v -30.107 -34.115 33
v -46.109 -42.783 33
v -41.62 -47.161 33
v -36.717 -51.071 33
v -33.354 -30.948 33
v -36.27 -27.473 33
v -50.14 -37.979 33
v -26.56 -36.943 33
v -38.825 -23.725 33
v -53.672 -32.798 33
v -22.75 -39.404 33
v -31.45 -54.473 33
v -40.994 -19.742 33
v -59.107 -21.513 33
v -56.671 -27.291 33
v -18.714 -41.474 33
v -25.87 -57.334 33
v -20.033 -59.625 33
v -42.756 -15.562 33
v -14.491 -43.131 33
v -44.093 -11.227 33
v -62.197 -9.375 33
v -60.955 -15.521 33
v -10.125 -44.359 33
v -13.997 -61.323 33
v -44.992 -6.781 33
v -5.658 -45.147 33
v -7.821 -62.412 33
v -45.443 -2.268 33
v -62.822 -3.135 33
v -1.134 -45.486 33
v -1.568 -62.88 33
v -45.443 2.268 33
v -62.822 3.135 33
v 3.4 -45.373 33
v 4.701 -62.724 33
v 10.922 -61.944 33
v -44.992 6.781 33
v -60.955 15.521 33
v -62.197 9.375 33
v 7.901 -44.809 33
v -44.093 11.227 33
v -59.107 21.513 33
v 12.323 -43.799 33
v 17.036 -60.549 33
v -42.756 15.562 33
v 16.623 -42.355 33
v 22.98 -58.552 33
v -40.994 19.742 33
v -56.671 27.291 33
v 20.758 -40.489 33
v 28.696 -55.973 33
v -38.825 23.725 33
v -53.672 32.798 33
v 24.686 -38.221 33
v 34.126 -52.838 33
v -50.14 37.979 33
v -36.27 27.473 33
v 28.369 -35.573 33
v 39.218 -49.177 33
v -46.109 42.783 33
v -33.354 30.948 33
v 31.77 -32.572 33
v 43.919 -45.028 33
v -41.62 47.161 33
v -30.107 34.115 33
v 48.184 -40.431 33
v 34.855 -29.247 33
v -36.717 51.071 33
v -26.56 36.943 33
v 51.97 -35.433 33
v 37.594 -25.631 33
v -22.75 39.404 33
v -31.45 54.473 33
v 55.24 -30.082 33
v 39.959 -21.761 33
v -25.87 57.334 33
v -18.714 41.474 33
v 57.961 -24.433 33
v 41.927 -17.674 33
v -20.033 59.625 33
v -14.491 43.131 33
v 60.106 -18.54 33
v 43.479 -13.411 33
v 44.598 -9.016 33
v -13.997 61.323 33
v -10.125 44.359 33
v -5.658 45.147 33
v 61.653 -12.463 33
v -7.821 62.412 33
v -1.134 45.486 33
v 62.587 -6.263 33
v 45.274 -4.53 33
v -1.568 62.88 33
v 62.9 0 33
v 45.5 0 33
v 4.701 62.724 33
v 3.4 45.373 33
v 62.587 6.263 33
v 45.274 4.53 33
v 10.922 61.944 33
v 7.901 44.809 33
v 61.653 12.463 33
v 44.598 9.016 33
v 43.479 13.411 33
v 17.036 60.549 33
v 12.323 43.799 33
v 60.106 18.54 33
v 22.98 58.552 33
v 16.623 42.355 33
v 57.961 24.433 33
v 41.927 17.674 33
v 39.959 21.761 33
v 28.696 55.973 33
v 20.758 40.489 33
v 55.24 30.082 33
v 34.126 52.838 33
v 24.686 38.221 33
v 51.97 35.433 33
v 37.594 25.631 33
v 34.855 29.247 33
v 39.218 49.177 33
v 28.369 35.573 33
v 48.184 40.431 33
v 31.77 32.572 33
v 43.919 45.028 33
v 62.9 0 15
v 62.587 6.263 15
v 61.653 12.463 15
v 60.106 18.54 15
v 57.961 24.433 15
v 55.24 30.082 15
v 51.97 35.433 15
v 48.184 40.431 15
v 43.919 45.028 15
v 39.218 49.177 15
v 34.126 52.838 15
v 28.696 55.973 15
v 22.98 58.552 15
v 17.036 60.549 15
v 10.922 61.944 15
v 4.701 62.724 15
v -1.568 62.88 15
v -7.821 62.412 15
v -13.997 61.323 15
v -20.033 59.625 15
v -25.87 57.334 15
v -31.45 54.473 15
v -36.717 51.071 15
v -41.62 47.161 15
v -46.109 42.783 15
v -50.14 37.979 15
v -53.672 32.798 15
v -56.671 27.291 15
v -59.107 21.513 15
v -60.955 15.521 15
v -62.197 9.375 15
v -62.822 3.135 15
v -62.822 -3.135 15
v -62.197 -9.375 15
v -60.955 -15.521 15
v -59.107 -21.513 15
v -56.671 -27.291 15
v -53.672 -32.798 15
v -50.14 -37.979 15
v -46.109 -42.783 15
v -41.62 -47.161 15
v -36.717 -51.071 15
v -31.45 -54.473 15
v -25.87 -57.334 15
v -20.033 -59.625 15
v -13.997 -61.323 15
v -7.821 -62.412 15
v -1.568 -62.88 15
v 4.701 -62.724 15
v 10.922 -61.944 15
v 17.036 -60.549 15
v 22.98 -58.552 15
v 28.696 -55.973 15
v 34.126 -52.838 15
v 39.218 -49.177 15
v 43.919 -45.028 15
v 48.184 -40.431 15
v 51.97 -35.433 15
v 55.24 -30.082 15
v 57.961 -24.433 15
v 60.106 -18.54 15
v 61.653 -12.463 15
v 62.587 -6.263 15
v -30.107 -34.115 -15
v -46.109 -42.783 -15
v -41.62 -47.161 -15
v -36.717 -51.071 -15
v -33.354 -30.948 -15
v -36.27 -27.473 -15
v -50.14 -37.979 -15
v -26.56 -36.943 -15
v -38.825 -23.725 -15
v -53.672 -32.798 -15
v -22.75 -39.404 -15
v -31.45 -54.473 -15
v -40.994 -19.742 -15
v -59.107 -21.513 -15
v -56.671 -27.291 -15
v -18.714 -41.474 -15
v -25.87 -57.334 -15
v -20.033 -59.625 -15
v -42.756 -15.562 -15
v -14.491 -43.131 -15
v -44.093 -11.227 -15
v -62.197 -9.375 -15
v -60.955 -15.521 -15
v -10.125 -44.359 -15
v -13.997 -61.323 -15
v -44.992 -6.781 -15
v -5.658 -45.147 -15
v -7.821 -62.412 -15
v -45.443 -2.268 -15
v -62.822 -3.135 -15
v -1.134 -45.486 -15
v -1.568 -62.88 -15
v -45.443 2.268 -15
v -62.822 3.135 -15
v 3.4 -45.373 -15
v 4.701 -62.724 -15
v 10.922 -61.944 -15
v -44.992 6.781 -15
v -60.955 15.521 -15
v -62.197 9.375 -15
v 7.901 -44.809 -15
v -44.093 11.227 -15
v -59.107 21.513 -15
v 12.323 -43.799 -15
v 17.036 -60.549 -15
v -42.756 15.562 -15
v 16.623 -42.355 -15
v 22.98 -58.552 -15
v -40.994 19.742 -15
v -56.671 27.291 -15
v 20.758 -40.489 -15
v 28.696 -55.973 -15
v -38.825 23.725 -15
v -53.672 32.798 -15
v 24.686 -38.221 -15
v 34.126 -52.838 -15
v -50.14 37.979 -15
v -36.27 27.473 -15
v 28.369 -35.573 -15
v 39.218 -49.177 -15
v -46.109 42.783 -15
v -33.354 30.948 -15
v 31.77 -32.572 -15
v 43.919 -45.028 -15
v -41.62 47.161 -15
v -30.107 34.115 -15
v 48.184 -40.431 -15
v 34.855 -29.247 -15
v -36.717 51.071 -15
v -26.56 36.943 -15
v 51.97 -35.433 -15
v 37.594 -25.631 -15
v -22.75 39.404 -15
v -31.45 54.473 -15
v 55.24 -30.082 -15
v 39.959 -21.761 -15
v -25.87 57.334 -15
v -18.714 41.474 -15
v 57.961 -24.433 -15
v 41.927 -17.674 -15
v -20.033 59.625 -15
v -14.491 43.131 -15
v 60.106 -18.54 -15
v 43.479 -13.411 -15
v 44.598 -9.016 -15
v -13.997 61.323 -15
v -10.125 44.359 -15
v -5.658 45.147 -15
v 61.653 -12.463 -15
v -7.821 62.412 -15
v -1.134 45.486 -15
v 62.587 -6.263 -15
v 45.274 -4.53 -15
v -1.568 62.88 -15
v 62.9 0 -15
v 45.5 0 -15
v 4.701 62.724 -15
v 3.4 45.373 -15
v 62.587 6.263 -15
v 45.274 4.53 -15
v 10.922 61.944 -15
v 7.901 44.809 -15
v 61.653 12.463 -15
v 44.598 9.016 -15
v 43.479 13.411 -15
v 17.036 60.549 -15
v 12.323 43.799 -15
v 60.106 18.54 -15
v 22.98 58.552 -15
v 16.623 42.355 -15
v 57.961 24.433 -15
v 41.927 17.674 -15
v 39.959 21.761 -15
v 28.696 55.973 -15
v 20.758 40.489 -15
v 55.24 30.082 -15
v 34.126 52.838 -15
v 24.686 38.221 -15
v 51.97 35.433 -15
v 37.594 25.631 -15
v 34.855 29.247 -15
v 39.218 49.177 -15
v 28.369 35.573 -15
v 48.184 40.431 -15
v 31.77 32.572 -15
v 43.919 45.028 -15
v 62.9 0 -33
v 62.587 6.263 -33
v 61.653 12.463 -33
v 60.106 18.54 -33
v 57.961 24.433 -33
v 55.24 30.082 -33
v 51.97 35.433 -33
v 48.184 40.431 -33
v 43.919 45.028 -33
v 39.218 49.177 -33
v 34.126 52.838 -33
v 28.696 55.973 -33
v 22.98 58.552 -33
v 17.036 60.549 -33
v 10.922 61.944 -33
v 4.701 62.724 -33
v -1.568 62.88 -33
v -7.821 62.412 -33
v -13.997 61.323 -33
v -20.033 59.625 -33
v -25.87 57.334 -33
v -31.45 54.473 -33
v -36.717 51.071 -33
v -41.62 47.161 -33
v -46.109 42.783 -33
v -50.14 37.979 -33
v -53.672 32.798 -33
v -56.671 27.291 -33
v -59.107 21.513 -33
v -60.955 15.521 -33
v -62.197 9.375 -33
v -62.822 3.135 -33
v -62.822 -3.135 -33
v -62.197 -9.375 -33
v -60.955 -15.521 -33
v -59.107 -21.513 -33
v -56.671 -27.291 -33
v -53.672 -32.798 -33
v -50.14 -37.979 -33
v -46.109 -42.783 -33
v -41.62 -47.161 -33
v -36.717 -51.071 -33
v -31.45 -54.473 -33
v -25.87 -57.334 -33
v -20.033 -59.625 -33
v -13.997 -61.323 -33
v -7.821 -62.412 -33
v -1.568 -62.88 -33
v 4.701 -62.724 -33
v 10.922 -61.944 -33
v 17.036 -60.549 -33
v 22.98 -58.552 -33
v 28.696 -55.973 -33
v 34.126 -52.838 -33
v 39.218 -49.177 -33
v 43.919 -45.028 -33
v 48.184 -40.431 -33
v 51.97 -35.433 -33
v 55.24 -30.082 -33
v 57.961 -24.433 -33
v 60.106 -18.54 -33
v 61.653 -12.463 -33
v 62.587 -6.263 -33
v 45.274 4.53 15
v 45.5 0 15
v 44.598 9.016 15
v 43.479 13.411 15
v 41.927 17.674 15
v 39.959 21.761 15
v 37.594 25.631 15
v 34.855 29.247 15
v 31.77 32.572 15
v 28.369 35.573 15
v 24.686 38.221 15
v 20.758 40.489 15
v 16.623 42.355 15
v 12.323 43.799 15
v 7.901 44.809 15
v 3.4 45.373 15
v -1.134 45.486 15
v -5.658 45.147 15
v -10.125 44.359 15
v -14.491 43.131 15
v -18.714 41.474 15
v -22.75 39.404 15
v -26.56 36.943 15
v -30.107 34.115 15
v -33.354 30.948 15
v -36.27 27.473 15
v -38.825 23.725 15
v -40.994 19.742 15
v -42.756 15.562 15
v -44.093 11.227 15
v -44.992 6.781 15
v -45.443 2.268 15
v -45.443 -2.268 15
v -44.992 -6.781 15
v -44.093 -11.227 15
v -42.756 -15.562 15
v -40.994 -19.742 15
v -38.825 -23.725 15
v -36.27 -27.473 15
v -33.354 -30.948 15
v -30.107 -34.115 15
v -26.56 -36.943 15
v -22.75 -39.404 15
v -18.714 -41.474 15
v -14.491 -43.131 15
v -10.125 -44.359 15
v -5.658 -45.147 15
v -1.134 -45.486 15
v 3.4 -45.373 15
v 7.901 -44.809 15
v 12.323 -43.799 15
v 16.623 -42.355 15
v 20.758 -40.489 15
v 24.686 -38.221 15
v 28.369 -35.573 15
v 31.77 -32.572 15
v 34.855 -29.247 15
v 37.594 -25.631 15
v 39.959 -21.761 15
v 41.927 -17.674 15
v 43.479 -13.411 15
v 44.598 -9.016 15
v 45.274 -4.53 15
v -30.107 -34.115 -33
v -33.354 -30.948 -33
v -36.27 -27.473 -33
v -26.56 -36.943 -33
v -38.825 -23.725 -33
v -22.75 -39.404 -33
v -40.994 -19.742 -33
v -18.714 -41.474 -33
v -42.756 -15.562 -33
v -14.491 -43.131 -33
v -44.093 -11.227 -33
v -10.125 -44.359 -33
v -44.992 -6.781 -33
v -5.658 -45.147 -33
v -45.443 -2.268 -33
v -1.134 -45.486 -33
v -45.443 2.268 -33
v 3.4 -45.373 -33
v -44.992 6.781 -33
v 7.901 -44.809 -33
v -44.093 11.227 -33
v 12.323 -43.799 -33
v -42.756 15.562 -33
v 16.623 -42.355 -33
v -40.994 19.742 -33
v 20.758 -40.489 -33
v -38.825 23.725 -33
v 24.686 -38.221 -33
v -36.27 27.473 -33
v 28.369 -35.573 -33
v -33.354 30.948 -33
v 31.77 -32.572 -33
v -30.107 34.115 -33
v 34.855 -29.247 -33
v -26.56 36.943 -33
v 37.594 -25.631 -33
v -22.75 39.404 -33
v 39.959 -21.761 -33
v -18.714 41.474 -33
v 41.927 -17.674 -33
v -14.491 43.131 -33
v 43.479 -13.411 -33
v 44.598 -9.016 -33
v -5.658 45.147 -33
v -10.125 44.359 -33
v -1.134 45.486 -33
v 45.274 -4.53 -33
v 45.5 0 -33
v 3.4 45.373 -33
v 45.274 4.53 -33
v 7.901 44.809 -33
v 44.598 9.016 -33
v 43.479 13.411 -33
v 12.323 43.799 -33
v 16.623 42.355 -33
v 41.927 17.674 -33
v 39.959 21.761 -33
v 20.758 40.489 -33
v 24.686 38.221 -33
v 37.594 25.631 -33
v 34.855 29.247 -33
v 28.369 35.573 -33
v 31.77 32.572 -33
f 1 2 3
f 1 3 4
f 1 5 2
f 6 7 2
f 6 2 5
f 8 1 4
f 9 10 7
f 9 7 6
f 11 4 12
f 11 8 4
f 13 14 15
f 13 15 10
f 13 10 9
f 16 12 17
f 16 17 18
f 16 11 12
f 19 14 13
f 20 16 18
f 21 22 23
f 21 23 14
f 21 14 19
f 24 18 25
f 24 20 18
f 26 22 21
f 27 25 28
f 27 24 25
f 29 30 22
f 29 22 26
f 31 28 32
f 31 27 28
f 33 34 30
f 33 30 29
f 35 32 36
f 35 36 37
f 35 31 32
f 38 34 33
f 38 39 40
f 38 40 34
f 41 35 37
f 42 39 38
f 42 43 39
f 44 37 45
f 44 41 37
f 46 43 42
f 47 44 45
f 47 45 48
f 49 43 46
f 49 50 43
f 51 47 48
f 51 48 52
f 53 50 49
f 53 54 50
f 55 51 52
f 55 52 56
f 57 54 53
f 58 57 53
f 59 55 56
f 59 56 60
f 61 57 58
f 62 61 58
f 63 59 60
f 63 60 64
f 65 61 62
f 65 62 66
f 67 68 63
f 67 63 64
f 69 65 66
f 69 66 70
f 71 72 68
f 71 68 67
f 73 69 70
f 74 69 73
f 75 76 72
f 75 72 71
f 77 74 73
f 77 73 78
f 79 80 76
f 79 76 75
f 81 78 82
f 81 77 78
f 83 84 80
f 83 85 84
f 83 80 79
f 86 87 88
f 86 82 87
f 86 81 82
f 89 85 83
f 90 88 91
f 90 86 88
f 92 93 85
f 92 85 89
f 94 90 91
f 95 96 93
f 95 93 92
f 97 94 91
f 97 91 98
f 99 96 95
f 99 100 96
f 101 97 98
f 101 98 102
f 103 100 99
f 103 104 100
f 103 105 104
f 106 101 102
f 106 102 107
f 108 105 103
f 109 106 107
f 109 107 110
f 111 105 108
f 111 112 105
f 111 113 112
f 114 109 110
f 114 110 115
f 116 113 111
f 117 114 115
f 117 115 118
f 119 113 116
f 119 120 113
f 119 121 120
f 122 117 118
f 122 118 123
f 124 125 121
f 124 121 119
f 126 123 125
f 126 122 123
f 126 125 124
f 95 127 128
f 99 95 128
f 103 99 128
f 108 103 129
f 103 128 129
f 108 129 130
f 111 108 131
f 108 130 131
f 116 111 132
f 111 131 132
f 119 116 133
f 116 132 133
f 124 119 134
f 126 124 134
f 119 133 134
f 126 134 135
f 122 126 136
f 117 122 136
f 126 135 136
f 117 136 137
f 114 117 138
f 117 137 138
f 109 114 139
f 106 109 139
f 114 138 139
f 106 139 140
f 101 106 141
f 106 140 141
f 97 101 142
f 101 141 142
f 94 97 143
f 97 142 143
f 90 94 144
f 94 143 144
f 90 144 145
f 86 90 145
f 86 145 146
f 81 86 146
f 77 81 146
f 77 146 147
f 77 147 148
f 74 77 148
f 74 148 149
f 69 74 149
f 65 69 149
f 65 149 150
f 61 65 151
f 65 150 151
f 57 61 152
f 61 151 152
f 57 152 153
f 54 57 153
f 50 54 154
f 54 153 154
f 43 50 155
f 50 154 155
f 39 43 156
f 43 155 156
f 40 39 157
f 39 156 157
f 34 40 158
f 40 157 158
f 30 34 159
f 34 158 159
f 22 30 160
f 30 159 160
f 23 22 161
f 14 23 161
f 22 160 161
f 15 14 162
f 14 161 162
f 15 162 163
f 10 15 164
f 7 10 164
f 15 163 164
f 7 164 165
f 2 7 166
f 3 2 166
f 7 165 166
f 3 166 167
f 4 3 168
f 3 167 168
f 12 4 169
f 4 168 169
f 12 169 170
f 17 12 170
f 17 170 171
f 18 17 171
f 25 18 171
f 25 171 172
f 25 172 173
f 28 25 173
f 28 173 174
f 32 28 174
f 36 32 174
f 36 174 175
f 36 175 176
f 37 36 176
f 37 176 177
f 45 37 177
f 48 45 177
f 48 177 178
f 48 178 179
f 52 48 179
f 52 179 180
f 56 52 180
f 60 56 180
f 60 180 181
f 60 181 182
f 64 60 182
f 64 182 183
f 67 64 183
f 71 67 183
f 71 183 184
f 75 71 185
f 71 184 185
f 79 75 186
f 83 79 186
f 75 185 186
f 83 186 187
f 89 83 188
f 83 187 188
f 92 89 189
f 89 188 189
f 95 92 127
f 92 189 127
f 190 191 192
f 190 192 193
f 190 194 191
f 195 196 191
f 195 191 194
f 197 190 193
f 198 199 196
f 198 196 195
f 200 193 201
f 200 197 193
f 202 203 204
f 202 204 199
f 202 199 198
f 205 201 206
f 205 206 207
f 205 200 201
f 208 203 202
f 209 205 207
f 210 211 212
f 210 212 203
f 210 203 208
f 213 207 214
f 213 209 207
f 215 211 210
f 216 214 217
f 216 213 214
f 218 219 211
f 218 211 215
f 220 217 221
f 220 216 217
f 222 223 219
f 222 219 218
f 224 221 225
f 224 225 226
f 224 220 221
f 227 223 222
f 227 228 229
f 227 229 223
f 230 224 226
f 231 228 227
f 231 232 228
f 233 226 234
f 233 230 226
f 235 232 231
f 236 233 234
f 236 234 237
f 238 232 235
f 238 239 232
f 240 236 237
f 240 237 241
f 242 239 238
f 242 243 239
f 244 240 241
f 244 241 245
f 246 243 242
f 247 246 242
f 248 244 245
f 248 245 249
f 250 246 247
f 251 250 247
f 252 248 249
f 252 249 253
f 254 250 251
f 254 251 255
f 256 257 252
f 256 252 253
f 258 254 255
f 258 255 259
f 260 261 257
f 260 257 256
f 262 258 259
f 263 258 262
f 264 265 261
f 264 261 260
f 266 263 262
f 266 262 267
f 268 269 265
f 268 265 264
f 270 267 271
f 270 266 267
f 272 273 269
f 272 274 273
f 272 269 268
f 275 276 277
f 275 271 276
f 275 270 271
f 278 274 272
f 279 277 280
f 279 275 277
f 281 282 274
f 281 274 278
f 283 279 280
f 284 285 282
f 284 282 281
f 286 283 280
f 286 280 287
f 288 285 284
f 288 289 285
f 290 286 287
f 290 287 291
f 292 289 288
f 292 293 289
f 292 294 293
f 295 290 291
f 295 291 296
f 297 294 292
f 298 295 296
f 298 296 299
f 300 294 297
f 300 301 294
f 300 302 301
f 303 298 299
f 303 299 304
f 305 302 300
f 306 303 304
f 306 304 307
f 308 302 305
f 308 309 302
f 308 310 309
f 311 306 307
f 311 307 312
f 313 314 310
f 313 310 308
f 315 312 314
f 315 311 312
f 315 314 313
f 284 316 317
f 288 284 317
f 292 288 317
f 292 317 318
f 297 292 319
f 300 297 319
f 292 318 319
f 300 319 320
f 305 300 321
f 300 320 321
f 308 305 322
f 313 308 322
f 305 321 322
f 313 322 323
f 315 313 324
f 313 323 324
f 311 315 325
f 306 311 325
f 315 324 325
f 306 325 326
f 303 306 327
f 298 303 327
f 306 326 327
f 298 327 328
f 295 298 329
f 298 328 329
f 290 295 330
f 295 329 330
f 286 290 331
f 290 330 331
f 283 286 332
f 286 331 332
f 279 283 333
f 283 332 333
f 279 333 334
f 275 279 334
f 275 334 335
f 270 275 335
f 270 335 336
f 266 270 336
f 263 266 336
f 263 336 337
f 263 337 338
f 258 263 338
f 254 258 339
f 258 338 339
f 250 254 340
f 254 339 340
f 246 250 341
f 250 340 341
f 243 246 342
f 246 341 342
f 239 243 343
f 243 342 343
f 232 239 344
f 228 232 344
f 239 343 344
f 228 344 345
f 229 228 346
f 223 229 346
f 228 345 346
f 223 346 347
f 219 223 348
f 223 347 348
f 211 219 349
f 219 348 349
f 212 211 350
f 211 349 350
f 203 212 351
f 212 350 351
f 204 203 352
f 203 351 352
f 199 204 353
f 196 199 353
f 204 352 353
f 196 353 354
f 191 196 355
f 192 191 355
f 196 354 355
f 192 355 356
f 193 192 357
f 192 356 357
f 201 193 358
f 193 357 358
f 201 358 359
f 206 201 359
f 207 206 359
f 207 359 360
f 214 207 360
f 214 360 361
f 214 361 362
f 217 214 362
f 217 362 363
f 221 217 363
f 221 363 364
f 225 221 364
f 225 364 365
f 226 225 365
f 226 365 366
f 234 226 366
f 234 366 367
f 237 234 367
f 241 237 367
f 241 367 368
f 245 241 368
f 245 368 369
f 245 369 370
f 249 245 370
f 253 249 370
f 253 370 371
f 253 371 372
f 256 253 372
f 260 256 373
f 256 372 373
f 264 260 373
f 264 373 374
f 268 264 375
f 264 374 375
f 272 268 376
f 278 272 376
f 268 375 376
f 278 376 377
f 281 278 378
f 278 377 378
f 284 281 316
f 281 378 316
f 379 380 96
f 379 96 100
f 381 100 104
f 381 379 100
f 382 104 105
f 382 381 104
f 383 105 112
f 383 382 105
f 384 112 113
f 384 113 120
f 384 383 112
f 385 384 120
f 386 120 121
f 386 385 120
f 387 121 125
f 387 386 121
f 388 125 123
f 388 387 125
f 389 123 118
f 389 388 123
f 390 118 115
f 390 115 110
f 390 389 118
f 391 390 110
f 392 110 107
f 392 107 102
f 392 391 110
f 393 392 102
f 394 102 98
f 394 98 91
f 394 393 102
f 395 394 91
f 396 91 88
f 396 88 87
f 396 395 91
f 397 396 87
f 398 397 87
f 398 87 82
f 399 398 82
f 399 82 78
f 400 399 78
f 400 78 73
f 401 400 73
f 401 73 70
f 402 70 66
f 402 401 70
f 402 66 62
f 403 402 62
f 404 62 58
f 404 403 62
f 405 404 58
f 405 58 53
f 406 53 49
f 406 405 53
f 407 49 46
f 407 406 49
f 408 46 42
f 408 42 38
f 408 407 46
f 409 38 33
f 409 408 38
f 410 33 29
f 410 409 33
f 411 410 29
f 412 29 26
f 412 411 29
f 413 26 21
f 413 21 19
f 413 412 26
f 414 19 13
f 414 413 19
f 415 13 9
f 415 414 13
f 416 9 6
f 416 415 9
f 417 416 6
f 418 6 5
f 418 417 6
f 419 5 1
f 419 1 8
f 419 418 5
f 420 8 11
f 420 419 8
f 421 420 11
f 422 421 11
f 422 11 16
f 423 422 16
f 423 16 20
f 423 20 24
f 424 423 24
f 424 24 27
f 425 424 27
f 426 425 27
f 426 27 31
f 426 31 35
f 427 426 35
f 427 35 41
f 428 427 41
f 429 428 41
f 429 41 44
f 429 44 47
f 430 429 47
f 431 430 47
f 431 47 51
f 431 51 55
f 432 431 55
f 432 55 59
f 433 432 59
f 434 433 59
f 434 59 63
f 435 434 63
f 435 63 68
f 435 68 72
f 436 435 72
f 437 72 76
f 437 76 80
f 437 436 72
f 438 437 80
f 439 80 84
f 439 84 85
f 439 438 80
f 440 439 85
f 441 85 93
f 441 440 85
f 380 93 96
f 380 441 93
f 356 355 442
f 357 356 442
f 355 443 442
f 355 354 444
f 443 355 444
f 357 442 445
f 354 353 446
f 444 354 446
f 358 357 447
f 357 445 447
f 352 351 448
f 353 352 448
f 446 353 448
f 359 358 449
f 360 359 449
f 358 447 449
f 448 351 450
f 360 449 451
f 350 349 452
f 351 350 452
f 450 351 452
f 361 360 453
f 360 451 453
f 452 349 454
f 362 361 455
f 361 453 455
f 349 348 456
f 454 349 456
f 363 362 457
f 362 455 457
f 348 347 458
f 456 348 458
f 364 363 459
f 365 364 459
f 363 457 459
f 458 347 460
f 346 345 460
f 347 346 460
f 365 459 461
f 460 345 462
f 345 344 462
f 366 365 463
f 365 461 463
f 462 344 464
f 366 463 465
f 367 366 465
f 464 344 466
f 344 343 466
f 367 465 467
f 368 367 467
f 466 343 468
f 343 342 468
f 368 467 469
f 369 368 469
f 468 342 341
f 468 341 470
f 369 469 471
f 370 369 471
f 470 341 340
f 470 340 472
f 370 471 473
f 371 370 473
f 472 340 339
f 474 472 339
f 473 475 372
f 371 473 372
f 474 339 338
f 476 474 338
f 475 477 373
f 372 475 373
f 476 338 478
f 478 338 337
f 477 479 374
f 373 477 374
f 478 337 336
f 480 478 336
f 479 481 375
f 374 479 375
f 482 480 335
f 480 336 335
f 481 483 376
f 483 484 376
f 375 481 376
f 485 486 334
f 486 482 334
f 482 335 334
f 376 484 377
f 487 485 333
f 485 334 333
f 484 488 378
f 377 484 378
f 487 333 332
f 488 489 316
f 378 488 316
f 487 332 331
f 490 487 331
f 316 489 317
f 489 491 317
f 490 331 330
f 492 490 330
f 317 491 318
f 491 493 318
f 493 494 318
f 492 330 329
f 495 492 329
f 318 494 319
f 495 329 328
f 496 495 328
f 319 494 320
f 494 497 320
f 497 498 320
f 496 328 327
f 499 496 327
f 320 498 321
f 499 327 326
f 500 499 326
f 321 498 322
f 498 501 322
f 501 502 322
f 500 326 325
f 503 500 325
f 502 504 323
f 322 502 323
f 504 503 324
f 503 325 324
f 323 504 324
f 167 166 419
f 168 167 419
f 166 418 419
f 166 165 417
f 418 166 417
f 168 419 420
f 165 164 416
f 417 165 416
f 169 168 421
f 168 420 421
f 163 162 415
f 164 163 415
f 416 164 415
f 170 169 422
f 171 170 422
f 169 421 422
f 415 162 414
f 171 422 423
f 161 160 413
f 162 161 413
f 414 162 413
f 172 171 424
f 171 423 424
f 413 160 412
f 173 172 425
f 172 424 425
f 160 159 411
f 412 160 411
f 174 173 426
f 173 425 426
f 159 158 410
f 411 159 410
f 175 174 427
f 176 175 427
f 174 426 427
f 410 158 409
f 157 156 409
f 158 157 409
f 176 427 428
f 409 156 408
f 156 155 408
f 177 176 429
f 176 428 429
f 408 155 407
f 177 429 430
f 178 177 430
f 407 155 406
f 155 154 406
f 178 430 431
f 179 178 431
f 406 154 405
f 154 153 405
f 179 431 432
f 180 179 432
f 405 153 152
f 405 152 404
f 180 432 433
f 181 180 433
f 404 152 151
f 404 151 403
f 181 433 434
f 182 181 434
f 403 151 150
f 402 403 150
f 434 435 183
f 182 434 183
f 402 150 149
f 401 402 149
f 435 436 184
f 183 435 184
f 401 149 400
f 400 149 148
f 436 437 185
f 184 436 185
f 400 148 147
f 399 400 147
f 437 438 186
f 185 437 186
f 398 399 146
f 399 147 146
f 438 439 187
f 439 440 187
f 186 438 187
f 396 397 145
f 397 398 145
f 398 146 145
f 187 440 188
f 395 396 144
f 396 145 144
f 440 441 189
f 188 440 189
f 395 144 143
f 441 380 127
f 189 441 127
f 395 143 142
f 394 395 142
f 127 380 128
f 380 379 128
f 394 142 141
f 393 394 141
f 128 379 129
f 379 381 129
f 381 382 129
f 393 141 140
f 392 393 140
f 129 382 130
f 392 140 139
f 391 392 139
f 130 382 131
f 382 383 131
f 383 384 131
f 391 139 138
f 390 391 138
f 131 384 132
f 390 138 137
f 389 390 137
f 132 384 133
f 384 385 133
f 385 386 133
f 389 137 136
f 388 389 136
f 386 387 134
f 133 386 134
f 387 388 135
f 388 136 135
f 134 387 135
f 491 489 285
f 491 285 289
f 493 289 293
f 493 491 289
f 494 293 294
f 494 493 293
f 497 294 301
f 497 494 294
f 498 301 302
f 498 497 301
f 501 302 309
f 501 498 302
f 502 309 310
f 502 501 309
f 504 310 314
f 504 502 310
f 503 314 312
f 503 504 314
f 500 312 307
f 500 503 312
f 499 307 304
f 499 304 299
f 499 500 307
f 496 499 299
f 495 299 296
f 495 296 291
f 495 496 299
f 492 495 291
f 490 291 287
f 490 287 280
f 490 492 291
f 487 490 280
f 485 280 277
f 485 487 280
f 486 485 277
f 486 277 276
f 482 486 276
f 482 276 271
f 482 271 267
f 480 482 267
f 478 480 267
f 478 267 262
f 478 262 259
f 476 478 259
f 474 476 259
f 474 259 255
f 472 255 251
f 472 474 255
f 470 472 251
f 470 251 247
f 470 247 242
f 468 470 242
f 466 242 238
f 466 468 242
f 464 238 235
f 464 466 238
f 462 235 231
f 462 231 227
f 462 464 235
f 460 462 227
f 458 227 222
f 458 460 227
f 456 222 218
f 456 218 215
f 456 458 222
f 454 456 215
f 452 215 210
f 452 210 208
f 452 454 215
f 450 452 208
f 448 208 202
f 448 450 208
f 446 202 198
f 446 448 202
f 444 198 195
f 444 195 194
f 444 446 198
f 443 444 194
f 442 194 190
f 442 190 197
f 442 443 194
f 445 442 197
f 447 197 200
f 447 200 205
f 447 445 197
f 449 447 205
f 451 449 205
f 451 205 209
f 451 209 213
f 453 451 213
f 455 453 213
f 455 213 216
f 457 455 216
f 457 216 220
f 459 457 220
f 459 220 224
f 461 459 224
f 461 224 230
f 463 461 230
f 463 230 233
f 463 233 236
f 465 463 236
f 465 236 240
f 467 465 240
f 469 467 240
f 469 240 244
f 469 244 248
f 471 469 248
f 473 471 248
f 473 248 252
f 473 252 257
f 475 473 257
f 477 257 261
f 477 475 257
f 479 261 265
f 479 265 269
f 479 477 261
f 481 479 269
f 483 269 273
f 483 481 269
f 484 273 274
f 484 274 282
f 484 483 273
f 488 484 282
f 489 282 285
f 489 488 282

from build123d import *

# Parameters (mm, degrees)
ENDTURN_R_START = 15
SKETCH_1_R      = 62.9
SKETCH_1_R_2    = 45.5
ENDTURN_R_DEPTH = 18
ENDTURN_L_START = -33
SKETCH_2_R      = 62.9
SKETCH_2_R_2    = 45.5
ENDTURN_L_DEPTH = 18


with BuildPart() as part:
    # Эскиз1 → Endturn_R (new body)
    with BuildSketch(Plane.XY.offset(ENDTURN_R_START)):
        Circle(SKETCH_1_R)
        Circle(SKETCH_1_R_2, mode=Mode.SUBTRACT)
    extrude(amount=ENDTURN_R_DEPTH)


with BuildPart() as body_2:
    # Эскиз2 → Endturn_L (new body)
    with BuildSketch(Plane.XY.offset(ENDTURN_L_START)):
        Circle(SKETCH_2_R)
        Circle(SKETCH_2_R_2, mode=Mode.SUBTRACT)
    extrude(amount=ENDTURN_L_DEPTH)


solid = Compound([part.part, body_2.part])
